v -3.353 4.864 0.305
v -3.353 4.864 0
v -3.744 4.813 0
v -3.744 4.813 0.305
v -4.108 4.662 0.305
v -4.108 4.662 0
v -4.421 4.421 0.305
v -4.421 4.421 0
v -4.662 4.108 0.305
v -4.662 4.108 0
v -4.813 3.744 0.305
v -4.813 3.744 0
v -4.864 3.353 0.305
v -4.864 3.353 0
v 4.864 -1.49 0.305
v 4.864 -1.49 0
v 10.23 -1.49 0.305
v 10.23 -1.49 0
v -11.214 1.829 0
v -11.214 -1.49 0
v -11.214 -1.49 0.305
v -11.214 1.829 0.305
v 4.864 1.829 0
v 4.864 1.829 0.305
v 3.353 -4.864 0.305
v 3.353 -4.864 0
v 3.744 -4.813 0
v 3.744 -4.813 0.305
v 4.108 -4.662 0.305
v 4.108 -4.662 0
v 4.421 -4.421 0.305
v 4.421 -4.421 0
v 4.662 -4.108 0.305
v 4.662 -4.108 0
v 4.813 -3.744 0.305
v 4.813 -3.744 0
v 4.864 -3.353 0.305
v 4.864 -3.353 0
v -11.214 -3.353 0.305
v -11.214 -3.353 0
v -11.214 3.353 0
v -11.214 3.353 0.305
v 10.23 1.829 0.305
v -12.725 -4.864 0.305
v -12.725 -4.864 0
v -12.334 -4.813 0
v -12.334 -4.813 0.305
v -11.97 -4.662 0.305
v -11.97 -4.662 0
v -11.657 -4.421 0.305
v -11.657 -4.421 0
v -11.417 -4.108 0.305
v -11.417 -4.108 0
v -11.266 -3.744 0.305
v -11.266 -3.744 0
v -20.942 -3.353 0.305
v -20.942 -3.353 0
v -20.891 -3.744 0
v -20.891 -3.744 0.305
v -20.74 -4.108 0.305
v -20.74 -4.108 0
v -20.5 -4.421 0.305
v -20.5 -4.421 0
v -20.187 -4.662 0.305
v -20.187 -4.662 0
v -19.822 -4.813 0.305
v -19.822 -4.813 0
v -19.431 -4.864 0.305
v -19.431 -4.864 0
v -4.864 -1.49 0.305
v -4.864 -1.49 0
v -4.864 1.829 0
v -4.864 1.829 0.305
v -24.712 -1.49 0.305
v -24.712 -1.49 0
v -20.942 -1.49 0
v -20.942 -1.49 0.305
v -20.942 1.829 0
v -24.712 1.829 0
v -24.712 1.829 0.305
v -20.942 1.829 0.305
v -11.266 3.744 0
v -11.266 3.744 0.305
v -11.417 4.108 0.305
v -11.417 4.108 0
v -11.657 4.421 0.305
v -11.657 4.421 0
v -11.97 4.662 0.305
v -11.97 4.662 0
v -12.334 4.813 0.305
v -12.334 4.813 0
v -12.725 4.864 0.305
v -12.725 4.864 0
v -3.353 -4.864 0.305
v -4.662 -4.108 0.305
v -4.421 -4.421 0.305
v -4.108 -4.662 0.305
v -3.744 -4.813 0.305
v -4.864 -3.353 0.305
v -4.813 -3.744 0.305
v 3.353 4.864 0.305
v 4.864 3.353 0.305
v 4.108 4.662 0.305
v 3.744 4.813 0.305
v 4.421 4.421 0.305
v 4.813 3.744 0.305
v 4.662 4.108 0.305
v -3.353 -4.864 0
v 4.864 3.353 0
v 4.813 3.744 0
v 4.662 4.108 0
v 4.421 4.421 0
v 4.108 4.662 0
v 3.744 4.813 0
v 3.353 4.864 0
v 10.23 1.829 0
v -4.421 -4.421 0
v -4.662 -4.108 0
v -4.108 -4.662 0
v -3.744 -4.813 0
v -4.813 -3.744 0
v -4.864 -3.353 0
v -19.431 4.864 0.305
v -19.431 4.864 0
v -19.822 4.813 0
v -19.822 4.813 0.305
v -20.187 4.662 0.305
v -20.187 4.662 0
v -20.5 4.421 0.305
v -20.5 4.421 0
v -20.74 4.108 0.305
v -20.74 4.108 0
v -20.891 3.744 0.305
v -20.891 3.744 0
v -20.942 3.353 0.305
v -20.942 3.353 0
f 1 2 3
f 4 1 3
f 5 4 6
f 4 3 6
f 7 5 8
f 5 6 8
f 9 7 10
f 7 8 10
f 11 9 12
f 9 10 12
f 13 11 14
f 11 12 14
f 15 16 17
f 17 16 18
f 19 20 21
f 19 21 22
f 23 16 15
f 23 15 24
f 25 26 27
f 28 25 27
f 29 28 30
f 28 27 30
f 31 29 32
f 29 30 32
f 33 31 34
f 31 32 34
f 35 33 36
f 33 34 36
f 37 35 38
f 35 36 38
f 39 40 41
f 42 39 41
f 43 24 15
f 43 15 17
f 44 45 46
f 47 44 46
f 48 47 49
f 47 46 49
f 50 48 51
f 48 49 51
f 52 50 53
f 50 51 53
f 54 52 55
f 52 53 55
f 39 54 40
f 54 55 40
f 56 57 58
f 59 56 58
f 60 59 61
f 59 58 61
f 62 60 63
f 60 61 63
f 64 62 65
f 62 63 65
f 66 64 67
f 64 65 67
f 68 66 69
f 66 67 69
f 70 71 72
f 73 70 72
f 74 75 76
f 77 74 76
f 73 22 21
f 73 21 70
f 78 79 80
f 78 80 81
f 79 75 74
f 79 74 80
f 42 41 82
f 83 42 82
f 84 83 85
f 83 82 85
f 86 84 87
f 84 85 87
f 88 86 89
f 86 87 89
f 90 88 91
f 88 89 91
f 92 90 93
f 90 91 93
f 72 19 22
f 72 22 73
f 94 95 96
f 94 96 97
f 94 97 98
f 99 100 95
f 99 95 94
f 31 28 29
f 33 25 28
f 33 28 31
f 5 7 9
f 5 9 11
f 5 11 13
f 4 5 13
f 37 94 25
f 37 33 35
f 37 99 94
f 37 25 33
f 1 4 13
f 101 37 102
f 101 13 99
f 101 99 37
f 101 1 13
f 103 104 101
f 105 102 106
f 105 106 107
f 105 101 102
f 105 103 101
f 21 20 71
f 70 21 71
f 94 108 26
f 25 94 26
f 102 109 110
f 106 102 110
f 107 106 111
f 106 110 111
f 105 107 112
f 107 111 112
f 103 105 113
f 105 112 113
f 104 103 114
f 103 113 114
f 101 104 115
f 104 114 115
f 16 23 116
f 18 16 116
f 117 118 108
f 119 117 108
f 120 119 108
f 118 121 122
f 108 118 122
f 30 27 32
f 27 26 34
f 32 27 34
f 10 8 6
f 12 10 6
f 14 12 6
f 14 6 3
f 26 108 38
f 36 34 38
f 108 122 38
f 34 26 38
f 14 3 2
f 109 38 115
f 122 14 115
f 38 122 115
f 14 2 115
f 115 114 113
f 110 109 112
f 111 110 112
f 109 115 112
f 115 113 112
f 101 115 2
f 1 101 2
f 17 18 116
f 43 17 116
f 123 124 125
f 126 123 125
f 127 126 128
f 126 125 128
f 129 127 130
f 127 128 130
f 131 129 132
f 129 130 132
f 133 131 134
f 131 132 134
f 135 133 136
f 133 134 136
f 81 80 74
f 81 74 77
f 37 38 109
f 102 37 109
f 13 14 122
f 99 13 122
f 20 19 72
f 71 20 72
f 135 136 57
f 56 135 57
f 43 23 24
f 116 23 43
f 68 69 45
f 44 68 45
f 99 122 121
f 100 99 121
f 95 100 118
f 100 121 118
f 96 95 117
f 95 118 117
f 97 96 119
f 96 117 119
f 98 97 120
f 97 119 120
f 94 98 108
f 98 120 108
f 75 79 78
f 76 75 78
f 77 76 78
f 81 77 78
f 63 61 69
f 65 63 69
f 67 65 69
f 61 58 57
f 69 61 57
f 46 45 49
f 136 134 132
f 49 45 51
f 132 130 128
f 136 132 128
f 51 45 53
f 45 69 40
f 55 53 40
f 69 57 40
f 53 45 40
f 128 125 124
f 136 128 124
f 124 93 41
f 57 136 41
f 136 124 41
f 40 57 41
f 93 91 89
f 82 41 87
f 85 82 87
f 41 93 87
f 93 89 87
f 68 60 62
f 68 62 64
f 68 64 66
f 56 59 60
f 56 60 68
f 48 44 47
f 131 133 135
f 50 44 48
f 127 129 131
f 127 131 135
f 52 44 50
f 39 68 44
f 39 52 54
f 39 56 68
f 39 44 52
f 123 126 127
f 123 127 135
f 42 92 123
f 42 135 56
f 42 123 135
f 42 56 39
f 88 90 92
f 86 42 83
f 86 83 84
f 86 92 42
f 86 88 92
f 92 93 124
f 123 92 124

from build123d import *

# Parameters (mm, degrees)
F1_DEPTH = 0.3048
F0_W     = 3.769632
F0_H     = 3.318387
F0_W_2   = 6.35
F0_W_3   = 5.365765
F2_DEPTH = 0.3048


with BuildPart() as f1:
    # F0 (on Top) → F1 (new body)
    with BuildSketch(Plane.XY):
        with BuildLine():
            Line((-11.2141, -3.3528), (-11.2141, -1.489728))
            Line((-11.2141, -1.489728), (-11.2141, 1.828659))
            Line((-11.2141, 1.828659), (-11.2141, 3.3528))
            ThreePointArc((-11.2141, 3.3528), (-11.65675, 4.42145), (-12.7254, 4.8641))
            Line((-12.7254, 4.8641), (-19.431, 4.8641))
            ThreePointArc((-19.431, 4.8641), (-20.49965, 4.42145), (-20.9423, 3.3528))
            Line((-20.9423, 3.3528), (-20.9423, 1.828659))
            Line((-20.9423, 1.828659), (-20.9423, -1.489728))
            Line((-20.9423, -1.489728), (-20.9423, -3.3528))
            ThreePointArc((-20.9423, -3.3528), (-20.49965, -4.42145), (-19.431, -4.8641))
            Line((-19.431, -4.8641), (-12.7254, -4.8641))
            ThreePointArc((-12.7254, -4.8641), (-11.65675, -4.42145), (-11.2141, -3.3528))
        make_face()
        with BuildLine():
            Line((-3.3528, -4.8641), (3.3528, -4.8641))
            ThreePointArc((3.3528, -4.8641), (4.42145, -4.42145), (4.8641, -3.3528))
            Line((4.8641, -3.3528), (4.8641, -1.489728))
            Line((4.8641, -1.489728), (4.8641, 1.828659))
            Line((4.8641, 1.828659), (4.8641, 3.3528))
            ThreePointArc((4.8641, 3.3528), (4.42145, 4.42145), (3.3528, 4.8641))
            Line((3.3528, 4.8641), (-3.3528, 4.8641))
            ThreePointArc((-3.3528, 4.8641), (-4.42145, 4.42145), (-4.8641, 3.3528))
            Line((-4.8641, 3.3528), (-4.8641, 1.828659))
            Line((-4.8641, 1.828659), (-4.8641, -1.489728))
            Line((-4.8641, -1.489728), (-4.8641, -3.3528))
            ThreePointArc((-4.8641, -3.3528), (-4.42145, -4.42145), (-3.3528, -4.8641))
        make_face()
    extrude(amount=F1_DEPTH)


with BuildPart() as f2:
    # F0 (on Top) → F2 (new body)
    with BuildSketch(Plane.XY):
        with Locations((-22.827116, 0.169465)):
            Rectangle(F0_W, F0_H)
        with Locations((-8.0391, 0.169465)):
            Rectangle(F0_W_2, F0_H)
        with Locations((7.546983, 0.169465)):
            Rectangle(F0_W_3, F0_H)
    extrude(amount=F2_DEPTH)


solid = Compound([f1.part, f2.part])
